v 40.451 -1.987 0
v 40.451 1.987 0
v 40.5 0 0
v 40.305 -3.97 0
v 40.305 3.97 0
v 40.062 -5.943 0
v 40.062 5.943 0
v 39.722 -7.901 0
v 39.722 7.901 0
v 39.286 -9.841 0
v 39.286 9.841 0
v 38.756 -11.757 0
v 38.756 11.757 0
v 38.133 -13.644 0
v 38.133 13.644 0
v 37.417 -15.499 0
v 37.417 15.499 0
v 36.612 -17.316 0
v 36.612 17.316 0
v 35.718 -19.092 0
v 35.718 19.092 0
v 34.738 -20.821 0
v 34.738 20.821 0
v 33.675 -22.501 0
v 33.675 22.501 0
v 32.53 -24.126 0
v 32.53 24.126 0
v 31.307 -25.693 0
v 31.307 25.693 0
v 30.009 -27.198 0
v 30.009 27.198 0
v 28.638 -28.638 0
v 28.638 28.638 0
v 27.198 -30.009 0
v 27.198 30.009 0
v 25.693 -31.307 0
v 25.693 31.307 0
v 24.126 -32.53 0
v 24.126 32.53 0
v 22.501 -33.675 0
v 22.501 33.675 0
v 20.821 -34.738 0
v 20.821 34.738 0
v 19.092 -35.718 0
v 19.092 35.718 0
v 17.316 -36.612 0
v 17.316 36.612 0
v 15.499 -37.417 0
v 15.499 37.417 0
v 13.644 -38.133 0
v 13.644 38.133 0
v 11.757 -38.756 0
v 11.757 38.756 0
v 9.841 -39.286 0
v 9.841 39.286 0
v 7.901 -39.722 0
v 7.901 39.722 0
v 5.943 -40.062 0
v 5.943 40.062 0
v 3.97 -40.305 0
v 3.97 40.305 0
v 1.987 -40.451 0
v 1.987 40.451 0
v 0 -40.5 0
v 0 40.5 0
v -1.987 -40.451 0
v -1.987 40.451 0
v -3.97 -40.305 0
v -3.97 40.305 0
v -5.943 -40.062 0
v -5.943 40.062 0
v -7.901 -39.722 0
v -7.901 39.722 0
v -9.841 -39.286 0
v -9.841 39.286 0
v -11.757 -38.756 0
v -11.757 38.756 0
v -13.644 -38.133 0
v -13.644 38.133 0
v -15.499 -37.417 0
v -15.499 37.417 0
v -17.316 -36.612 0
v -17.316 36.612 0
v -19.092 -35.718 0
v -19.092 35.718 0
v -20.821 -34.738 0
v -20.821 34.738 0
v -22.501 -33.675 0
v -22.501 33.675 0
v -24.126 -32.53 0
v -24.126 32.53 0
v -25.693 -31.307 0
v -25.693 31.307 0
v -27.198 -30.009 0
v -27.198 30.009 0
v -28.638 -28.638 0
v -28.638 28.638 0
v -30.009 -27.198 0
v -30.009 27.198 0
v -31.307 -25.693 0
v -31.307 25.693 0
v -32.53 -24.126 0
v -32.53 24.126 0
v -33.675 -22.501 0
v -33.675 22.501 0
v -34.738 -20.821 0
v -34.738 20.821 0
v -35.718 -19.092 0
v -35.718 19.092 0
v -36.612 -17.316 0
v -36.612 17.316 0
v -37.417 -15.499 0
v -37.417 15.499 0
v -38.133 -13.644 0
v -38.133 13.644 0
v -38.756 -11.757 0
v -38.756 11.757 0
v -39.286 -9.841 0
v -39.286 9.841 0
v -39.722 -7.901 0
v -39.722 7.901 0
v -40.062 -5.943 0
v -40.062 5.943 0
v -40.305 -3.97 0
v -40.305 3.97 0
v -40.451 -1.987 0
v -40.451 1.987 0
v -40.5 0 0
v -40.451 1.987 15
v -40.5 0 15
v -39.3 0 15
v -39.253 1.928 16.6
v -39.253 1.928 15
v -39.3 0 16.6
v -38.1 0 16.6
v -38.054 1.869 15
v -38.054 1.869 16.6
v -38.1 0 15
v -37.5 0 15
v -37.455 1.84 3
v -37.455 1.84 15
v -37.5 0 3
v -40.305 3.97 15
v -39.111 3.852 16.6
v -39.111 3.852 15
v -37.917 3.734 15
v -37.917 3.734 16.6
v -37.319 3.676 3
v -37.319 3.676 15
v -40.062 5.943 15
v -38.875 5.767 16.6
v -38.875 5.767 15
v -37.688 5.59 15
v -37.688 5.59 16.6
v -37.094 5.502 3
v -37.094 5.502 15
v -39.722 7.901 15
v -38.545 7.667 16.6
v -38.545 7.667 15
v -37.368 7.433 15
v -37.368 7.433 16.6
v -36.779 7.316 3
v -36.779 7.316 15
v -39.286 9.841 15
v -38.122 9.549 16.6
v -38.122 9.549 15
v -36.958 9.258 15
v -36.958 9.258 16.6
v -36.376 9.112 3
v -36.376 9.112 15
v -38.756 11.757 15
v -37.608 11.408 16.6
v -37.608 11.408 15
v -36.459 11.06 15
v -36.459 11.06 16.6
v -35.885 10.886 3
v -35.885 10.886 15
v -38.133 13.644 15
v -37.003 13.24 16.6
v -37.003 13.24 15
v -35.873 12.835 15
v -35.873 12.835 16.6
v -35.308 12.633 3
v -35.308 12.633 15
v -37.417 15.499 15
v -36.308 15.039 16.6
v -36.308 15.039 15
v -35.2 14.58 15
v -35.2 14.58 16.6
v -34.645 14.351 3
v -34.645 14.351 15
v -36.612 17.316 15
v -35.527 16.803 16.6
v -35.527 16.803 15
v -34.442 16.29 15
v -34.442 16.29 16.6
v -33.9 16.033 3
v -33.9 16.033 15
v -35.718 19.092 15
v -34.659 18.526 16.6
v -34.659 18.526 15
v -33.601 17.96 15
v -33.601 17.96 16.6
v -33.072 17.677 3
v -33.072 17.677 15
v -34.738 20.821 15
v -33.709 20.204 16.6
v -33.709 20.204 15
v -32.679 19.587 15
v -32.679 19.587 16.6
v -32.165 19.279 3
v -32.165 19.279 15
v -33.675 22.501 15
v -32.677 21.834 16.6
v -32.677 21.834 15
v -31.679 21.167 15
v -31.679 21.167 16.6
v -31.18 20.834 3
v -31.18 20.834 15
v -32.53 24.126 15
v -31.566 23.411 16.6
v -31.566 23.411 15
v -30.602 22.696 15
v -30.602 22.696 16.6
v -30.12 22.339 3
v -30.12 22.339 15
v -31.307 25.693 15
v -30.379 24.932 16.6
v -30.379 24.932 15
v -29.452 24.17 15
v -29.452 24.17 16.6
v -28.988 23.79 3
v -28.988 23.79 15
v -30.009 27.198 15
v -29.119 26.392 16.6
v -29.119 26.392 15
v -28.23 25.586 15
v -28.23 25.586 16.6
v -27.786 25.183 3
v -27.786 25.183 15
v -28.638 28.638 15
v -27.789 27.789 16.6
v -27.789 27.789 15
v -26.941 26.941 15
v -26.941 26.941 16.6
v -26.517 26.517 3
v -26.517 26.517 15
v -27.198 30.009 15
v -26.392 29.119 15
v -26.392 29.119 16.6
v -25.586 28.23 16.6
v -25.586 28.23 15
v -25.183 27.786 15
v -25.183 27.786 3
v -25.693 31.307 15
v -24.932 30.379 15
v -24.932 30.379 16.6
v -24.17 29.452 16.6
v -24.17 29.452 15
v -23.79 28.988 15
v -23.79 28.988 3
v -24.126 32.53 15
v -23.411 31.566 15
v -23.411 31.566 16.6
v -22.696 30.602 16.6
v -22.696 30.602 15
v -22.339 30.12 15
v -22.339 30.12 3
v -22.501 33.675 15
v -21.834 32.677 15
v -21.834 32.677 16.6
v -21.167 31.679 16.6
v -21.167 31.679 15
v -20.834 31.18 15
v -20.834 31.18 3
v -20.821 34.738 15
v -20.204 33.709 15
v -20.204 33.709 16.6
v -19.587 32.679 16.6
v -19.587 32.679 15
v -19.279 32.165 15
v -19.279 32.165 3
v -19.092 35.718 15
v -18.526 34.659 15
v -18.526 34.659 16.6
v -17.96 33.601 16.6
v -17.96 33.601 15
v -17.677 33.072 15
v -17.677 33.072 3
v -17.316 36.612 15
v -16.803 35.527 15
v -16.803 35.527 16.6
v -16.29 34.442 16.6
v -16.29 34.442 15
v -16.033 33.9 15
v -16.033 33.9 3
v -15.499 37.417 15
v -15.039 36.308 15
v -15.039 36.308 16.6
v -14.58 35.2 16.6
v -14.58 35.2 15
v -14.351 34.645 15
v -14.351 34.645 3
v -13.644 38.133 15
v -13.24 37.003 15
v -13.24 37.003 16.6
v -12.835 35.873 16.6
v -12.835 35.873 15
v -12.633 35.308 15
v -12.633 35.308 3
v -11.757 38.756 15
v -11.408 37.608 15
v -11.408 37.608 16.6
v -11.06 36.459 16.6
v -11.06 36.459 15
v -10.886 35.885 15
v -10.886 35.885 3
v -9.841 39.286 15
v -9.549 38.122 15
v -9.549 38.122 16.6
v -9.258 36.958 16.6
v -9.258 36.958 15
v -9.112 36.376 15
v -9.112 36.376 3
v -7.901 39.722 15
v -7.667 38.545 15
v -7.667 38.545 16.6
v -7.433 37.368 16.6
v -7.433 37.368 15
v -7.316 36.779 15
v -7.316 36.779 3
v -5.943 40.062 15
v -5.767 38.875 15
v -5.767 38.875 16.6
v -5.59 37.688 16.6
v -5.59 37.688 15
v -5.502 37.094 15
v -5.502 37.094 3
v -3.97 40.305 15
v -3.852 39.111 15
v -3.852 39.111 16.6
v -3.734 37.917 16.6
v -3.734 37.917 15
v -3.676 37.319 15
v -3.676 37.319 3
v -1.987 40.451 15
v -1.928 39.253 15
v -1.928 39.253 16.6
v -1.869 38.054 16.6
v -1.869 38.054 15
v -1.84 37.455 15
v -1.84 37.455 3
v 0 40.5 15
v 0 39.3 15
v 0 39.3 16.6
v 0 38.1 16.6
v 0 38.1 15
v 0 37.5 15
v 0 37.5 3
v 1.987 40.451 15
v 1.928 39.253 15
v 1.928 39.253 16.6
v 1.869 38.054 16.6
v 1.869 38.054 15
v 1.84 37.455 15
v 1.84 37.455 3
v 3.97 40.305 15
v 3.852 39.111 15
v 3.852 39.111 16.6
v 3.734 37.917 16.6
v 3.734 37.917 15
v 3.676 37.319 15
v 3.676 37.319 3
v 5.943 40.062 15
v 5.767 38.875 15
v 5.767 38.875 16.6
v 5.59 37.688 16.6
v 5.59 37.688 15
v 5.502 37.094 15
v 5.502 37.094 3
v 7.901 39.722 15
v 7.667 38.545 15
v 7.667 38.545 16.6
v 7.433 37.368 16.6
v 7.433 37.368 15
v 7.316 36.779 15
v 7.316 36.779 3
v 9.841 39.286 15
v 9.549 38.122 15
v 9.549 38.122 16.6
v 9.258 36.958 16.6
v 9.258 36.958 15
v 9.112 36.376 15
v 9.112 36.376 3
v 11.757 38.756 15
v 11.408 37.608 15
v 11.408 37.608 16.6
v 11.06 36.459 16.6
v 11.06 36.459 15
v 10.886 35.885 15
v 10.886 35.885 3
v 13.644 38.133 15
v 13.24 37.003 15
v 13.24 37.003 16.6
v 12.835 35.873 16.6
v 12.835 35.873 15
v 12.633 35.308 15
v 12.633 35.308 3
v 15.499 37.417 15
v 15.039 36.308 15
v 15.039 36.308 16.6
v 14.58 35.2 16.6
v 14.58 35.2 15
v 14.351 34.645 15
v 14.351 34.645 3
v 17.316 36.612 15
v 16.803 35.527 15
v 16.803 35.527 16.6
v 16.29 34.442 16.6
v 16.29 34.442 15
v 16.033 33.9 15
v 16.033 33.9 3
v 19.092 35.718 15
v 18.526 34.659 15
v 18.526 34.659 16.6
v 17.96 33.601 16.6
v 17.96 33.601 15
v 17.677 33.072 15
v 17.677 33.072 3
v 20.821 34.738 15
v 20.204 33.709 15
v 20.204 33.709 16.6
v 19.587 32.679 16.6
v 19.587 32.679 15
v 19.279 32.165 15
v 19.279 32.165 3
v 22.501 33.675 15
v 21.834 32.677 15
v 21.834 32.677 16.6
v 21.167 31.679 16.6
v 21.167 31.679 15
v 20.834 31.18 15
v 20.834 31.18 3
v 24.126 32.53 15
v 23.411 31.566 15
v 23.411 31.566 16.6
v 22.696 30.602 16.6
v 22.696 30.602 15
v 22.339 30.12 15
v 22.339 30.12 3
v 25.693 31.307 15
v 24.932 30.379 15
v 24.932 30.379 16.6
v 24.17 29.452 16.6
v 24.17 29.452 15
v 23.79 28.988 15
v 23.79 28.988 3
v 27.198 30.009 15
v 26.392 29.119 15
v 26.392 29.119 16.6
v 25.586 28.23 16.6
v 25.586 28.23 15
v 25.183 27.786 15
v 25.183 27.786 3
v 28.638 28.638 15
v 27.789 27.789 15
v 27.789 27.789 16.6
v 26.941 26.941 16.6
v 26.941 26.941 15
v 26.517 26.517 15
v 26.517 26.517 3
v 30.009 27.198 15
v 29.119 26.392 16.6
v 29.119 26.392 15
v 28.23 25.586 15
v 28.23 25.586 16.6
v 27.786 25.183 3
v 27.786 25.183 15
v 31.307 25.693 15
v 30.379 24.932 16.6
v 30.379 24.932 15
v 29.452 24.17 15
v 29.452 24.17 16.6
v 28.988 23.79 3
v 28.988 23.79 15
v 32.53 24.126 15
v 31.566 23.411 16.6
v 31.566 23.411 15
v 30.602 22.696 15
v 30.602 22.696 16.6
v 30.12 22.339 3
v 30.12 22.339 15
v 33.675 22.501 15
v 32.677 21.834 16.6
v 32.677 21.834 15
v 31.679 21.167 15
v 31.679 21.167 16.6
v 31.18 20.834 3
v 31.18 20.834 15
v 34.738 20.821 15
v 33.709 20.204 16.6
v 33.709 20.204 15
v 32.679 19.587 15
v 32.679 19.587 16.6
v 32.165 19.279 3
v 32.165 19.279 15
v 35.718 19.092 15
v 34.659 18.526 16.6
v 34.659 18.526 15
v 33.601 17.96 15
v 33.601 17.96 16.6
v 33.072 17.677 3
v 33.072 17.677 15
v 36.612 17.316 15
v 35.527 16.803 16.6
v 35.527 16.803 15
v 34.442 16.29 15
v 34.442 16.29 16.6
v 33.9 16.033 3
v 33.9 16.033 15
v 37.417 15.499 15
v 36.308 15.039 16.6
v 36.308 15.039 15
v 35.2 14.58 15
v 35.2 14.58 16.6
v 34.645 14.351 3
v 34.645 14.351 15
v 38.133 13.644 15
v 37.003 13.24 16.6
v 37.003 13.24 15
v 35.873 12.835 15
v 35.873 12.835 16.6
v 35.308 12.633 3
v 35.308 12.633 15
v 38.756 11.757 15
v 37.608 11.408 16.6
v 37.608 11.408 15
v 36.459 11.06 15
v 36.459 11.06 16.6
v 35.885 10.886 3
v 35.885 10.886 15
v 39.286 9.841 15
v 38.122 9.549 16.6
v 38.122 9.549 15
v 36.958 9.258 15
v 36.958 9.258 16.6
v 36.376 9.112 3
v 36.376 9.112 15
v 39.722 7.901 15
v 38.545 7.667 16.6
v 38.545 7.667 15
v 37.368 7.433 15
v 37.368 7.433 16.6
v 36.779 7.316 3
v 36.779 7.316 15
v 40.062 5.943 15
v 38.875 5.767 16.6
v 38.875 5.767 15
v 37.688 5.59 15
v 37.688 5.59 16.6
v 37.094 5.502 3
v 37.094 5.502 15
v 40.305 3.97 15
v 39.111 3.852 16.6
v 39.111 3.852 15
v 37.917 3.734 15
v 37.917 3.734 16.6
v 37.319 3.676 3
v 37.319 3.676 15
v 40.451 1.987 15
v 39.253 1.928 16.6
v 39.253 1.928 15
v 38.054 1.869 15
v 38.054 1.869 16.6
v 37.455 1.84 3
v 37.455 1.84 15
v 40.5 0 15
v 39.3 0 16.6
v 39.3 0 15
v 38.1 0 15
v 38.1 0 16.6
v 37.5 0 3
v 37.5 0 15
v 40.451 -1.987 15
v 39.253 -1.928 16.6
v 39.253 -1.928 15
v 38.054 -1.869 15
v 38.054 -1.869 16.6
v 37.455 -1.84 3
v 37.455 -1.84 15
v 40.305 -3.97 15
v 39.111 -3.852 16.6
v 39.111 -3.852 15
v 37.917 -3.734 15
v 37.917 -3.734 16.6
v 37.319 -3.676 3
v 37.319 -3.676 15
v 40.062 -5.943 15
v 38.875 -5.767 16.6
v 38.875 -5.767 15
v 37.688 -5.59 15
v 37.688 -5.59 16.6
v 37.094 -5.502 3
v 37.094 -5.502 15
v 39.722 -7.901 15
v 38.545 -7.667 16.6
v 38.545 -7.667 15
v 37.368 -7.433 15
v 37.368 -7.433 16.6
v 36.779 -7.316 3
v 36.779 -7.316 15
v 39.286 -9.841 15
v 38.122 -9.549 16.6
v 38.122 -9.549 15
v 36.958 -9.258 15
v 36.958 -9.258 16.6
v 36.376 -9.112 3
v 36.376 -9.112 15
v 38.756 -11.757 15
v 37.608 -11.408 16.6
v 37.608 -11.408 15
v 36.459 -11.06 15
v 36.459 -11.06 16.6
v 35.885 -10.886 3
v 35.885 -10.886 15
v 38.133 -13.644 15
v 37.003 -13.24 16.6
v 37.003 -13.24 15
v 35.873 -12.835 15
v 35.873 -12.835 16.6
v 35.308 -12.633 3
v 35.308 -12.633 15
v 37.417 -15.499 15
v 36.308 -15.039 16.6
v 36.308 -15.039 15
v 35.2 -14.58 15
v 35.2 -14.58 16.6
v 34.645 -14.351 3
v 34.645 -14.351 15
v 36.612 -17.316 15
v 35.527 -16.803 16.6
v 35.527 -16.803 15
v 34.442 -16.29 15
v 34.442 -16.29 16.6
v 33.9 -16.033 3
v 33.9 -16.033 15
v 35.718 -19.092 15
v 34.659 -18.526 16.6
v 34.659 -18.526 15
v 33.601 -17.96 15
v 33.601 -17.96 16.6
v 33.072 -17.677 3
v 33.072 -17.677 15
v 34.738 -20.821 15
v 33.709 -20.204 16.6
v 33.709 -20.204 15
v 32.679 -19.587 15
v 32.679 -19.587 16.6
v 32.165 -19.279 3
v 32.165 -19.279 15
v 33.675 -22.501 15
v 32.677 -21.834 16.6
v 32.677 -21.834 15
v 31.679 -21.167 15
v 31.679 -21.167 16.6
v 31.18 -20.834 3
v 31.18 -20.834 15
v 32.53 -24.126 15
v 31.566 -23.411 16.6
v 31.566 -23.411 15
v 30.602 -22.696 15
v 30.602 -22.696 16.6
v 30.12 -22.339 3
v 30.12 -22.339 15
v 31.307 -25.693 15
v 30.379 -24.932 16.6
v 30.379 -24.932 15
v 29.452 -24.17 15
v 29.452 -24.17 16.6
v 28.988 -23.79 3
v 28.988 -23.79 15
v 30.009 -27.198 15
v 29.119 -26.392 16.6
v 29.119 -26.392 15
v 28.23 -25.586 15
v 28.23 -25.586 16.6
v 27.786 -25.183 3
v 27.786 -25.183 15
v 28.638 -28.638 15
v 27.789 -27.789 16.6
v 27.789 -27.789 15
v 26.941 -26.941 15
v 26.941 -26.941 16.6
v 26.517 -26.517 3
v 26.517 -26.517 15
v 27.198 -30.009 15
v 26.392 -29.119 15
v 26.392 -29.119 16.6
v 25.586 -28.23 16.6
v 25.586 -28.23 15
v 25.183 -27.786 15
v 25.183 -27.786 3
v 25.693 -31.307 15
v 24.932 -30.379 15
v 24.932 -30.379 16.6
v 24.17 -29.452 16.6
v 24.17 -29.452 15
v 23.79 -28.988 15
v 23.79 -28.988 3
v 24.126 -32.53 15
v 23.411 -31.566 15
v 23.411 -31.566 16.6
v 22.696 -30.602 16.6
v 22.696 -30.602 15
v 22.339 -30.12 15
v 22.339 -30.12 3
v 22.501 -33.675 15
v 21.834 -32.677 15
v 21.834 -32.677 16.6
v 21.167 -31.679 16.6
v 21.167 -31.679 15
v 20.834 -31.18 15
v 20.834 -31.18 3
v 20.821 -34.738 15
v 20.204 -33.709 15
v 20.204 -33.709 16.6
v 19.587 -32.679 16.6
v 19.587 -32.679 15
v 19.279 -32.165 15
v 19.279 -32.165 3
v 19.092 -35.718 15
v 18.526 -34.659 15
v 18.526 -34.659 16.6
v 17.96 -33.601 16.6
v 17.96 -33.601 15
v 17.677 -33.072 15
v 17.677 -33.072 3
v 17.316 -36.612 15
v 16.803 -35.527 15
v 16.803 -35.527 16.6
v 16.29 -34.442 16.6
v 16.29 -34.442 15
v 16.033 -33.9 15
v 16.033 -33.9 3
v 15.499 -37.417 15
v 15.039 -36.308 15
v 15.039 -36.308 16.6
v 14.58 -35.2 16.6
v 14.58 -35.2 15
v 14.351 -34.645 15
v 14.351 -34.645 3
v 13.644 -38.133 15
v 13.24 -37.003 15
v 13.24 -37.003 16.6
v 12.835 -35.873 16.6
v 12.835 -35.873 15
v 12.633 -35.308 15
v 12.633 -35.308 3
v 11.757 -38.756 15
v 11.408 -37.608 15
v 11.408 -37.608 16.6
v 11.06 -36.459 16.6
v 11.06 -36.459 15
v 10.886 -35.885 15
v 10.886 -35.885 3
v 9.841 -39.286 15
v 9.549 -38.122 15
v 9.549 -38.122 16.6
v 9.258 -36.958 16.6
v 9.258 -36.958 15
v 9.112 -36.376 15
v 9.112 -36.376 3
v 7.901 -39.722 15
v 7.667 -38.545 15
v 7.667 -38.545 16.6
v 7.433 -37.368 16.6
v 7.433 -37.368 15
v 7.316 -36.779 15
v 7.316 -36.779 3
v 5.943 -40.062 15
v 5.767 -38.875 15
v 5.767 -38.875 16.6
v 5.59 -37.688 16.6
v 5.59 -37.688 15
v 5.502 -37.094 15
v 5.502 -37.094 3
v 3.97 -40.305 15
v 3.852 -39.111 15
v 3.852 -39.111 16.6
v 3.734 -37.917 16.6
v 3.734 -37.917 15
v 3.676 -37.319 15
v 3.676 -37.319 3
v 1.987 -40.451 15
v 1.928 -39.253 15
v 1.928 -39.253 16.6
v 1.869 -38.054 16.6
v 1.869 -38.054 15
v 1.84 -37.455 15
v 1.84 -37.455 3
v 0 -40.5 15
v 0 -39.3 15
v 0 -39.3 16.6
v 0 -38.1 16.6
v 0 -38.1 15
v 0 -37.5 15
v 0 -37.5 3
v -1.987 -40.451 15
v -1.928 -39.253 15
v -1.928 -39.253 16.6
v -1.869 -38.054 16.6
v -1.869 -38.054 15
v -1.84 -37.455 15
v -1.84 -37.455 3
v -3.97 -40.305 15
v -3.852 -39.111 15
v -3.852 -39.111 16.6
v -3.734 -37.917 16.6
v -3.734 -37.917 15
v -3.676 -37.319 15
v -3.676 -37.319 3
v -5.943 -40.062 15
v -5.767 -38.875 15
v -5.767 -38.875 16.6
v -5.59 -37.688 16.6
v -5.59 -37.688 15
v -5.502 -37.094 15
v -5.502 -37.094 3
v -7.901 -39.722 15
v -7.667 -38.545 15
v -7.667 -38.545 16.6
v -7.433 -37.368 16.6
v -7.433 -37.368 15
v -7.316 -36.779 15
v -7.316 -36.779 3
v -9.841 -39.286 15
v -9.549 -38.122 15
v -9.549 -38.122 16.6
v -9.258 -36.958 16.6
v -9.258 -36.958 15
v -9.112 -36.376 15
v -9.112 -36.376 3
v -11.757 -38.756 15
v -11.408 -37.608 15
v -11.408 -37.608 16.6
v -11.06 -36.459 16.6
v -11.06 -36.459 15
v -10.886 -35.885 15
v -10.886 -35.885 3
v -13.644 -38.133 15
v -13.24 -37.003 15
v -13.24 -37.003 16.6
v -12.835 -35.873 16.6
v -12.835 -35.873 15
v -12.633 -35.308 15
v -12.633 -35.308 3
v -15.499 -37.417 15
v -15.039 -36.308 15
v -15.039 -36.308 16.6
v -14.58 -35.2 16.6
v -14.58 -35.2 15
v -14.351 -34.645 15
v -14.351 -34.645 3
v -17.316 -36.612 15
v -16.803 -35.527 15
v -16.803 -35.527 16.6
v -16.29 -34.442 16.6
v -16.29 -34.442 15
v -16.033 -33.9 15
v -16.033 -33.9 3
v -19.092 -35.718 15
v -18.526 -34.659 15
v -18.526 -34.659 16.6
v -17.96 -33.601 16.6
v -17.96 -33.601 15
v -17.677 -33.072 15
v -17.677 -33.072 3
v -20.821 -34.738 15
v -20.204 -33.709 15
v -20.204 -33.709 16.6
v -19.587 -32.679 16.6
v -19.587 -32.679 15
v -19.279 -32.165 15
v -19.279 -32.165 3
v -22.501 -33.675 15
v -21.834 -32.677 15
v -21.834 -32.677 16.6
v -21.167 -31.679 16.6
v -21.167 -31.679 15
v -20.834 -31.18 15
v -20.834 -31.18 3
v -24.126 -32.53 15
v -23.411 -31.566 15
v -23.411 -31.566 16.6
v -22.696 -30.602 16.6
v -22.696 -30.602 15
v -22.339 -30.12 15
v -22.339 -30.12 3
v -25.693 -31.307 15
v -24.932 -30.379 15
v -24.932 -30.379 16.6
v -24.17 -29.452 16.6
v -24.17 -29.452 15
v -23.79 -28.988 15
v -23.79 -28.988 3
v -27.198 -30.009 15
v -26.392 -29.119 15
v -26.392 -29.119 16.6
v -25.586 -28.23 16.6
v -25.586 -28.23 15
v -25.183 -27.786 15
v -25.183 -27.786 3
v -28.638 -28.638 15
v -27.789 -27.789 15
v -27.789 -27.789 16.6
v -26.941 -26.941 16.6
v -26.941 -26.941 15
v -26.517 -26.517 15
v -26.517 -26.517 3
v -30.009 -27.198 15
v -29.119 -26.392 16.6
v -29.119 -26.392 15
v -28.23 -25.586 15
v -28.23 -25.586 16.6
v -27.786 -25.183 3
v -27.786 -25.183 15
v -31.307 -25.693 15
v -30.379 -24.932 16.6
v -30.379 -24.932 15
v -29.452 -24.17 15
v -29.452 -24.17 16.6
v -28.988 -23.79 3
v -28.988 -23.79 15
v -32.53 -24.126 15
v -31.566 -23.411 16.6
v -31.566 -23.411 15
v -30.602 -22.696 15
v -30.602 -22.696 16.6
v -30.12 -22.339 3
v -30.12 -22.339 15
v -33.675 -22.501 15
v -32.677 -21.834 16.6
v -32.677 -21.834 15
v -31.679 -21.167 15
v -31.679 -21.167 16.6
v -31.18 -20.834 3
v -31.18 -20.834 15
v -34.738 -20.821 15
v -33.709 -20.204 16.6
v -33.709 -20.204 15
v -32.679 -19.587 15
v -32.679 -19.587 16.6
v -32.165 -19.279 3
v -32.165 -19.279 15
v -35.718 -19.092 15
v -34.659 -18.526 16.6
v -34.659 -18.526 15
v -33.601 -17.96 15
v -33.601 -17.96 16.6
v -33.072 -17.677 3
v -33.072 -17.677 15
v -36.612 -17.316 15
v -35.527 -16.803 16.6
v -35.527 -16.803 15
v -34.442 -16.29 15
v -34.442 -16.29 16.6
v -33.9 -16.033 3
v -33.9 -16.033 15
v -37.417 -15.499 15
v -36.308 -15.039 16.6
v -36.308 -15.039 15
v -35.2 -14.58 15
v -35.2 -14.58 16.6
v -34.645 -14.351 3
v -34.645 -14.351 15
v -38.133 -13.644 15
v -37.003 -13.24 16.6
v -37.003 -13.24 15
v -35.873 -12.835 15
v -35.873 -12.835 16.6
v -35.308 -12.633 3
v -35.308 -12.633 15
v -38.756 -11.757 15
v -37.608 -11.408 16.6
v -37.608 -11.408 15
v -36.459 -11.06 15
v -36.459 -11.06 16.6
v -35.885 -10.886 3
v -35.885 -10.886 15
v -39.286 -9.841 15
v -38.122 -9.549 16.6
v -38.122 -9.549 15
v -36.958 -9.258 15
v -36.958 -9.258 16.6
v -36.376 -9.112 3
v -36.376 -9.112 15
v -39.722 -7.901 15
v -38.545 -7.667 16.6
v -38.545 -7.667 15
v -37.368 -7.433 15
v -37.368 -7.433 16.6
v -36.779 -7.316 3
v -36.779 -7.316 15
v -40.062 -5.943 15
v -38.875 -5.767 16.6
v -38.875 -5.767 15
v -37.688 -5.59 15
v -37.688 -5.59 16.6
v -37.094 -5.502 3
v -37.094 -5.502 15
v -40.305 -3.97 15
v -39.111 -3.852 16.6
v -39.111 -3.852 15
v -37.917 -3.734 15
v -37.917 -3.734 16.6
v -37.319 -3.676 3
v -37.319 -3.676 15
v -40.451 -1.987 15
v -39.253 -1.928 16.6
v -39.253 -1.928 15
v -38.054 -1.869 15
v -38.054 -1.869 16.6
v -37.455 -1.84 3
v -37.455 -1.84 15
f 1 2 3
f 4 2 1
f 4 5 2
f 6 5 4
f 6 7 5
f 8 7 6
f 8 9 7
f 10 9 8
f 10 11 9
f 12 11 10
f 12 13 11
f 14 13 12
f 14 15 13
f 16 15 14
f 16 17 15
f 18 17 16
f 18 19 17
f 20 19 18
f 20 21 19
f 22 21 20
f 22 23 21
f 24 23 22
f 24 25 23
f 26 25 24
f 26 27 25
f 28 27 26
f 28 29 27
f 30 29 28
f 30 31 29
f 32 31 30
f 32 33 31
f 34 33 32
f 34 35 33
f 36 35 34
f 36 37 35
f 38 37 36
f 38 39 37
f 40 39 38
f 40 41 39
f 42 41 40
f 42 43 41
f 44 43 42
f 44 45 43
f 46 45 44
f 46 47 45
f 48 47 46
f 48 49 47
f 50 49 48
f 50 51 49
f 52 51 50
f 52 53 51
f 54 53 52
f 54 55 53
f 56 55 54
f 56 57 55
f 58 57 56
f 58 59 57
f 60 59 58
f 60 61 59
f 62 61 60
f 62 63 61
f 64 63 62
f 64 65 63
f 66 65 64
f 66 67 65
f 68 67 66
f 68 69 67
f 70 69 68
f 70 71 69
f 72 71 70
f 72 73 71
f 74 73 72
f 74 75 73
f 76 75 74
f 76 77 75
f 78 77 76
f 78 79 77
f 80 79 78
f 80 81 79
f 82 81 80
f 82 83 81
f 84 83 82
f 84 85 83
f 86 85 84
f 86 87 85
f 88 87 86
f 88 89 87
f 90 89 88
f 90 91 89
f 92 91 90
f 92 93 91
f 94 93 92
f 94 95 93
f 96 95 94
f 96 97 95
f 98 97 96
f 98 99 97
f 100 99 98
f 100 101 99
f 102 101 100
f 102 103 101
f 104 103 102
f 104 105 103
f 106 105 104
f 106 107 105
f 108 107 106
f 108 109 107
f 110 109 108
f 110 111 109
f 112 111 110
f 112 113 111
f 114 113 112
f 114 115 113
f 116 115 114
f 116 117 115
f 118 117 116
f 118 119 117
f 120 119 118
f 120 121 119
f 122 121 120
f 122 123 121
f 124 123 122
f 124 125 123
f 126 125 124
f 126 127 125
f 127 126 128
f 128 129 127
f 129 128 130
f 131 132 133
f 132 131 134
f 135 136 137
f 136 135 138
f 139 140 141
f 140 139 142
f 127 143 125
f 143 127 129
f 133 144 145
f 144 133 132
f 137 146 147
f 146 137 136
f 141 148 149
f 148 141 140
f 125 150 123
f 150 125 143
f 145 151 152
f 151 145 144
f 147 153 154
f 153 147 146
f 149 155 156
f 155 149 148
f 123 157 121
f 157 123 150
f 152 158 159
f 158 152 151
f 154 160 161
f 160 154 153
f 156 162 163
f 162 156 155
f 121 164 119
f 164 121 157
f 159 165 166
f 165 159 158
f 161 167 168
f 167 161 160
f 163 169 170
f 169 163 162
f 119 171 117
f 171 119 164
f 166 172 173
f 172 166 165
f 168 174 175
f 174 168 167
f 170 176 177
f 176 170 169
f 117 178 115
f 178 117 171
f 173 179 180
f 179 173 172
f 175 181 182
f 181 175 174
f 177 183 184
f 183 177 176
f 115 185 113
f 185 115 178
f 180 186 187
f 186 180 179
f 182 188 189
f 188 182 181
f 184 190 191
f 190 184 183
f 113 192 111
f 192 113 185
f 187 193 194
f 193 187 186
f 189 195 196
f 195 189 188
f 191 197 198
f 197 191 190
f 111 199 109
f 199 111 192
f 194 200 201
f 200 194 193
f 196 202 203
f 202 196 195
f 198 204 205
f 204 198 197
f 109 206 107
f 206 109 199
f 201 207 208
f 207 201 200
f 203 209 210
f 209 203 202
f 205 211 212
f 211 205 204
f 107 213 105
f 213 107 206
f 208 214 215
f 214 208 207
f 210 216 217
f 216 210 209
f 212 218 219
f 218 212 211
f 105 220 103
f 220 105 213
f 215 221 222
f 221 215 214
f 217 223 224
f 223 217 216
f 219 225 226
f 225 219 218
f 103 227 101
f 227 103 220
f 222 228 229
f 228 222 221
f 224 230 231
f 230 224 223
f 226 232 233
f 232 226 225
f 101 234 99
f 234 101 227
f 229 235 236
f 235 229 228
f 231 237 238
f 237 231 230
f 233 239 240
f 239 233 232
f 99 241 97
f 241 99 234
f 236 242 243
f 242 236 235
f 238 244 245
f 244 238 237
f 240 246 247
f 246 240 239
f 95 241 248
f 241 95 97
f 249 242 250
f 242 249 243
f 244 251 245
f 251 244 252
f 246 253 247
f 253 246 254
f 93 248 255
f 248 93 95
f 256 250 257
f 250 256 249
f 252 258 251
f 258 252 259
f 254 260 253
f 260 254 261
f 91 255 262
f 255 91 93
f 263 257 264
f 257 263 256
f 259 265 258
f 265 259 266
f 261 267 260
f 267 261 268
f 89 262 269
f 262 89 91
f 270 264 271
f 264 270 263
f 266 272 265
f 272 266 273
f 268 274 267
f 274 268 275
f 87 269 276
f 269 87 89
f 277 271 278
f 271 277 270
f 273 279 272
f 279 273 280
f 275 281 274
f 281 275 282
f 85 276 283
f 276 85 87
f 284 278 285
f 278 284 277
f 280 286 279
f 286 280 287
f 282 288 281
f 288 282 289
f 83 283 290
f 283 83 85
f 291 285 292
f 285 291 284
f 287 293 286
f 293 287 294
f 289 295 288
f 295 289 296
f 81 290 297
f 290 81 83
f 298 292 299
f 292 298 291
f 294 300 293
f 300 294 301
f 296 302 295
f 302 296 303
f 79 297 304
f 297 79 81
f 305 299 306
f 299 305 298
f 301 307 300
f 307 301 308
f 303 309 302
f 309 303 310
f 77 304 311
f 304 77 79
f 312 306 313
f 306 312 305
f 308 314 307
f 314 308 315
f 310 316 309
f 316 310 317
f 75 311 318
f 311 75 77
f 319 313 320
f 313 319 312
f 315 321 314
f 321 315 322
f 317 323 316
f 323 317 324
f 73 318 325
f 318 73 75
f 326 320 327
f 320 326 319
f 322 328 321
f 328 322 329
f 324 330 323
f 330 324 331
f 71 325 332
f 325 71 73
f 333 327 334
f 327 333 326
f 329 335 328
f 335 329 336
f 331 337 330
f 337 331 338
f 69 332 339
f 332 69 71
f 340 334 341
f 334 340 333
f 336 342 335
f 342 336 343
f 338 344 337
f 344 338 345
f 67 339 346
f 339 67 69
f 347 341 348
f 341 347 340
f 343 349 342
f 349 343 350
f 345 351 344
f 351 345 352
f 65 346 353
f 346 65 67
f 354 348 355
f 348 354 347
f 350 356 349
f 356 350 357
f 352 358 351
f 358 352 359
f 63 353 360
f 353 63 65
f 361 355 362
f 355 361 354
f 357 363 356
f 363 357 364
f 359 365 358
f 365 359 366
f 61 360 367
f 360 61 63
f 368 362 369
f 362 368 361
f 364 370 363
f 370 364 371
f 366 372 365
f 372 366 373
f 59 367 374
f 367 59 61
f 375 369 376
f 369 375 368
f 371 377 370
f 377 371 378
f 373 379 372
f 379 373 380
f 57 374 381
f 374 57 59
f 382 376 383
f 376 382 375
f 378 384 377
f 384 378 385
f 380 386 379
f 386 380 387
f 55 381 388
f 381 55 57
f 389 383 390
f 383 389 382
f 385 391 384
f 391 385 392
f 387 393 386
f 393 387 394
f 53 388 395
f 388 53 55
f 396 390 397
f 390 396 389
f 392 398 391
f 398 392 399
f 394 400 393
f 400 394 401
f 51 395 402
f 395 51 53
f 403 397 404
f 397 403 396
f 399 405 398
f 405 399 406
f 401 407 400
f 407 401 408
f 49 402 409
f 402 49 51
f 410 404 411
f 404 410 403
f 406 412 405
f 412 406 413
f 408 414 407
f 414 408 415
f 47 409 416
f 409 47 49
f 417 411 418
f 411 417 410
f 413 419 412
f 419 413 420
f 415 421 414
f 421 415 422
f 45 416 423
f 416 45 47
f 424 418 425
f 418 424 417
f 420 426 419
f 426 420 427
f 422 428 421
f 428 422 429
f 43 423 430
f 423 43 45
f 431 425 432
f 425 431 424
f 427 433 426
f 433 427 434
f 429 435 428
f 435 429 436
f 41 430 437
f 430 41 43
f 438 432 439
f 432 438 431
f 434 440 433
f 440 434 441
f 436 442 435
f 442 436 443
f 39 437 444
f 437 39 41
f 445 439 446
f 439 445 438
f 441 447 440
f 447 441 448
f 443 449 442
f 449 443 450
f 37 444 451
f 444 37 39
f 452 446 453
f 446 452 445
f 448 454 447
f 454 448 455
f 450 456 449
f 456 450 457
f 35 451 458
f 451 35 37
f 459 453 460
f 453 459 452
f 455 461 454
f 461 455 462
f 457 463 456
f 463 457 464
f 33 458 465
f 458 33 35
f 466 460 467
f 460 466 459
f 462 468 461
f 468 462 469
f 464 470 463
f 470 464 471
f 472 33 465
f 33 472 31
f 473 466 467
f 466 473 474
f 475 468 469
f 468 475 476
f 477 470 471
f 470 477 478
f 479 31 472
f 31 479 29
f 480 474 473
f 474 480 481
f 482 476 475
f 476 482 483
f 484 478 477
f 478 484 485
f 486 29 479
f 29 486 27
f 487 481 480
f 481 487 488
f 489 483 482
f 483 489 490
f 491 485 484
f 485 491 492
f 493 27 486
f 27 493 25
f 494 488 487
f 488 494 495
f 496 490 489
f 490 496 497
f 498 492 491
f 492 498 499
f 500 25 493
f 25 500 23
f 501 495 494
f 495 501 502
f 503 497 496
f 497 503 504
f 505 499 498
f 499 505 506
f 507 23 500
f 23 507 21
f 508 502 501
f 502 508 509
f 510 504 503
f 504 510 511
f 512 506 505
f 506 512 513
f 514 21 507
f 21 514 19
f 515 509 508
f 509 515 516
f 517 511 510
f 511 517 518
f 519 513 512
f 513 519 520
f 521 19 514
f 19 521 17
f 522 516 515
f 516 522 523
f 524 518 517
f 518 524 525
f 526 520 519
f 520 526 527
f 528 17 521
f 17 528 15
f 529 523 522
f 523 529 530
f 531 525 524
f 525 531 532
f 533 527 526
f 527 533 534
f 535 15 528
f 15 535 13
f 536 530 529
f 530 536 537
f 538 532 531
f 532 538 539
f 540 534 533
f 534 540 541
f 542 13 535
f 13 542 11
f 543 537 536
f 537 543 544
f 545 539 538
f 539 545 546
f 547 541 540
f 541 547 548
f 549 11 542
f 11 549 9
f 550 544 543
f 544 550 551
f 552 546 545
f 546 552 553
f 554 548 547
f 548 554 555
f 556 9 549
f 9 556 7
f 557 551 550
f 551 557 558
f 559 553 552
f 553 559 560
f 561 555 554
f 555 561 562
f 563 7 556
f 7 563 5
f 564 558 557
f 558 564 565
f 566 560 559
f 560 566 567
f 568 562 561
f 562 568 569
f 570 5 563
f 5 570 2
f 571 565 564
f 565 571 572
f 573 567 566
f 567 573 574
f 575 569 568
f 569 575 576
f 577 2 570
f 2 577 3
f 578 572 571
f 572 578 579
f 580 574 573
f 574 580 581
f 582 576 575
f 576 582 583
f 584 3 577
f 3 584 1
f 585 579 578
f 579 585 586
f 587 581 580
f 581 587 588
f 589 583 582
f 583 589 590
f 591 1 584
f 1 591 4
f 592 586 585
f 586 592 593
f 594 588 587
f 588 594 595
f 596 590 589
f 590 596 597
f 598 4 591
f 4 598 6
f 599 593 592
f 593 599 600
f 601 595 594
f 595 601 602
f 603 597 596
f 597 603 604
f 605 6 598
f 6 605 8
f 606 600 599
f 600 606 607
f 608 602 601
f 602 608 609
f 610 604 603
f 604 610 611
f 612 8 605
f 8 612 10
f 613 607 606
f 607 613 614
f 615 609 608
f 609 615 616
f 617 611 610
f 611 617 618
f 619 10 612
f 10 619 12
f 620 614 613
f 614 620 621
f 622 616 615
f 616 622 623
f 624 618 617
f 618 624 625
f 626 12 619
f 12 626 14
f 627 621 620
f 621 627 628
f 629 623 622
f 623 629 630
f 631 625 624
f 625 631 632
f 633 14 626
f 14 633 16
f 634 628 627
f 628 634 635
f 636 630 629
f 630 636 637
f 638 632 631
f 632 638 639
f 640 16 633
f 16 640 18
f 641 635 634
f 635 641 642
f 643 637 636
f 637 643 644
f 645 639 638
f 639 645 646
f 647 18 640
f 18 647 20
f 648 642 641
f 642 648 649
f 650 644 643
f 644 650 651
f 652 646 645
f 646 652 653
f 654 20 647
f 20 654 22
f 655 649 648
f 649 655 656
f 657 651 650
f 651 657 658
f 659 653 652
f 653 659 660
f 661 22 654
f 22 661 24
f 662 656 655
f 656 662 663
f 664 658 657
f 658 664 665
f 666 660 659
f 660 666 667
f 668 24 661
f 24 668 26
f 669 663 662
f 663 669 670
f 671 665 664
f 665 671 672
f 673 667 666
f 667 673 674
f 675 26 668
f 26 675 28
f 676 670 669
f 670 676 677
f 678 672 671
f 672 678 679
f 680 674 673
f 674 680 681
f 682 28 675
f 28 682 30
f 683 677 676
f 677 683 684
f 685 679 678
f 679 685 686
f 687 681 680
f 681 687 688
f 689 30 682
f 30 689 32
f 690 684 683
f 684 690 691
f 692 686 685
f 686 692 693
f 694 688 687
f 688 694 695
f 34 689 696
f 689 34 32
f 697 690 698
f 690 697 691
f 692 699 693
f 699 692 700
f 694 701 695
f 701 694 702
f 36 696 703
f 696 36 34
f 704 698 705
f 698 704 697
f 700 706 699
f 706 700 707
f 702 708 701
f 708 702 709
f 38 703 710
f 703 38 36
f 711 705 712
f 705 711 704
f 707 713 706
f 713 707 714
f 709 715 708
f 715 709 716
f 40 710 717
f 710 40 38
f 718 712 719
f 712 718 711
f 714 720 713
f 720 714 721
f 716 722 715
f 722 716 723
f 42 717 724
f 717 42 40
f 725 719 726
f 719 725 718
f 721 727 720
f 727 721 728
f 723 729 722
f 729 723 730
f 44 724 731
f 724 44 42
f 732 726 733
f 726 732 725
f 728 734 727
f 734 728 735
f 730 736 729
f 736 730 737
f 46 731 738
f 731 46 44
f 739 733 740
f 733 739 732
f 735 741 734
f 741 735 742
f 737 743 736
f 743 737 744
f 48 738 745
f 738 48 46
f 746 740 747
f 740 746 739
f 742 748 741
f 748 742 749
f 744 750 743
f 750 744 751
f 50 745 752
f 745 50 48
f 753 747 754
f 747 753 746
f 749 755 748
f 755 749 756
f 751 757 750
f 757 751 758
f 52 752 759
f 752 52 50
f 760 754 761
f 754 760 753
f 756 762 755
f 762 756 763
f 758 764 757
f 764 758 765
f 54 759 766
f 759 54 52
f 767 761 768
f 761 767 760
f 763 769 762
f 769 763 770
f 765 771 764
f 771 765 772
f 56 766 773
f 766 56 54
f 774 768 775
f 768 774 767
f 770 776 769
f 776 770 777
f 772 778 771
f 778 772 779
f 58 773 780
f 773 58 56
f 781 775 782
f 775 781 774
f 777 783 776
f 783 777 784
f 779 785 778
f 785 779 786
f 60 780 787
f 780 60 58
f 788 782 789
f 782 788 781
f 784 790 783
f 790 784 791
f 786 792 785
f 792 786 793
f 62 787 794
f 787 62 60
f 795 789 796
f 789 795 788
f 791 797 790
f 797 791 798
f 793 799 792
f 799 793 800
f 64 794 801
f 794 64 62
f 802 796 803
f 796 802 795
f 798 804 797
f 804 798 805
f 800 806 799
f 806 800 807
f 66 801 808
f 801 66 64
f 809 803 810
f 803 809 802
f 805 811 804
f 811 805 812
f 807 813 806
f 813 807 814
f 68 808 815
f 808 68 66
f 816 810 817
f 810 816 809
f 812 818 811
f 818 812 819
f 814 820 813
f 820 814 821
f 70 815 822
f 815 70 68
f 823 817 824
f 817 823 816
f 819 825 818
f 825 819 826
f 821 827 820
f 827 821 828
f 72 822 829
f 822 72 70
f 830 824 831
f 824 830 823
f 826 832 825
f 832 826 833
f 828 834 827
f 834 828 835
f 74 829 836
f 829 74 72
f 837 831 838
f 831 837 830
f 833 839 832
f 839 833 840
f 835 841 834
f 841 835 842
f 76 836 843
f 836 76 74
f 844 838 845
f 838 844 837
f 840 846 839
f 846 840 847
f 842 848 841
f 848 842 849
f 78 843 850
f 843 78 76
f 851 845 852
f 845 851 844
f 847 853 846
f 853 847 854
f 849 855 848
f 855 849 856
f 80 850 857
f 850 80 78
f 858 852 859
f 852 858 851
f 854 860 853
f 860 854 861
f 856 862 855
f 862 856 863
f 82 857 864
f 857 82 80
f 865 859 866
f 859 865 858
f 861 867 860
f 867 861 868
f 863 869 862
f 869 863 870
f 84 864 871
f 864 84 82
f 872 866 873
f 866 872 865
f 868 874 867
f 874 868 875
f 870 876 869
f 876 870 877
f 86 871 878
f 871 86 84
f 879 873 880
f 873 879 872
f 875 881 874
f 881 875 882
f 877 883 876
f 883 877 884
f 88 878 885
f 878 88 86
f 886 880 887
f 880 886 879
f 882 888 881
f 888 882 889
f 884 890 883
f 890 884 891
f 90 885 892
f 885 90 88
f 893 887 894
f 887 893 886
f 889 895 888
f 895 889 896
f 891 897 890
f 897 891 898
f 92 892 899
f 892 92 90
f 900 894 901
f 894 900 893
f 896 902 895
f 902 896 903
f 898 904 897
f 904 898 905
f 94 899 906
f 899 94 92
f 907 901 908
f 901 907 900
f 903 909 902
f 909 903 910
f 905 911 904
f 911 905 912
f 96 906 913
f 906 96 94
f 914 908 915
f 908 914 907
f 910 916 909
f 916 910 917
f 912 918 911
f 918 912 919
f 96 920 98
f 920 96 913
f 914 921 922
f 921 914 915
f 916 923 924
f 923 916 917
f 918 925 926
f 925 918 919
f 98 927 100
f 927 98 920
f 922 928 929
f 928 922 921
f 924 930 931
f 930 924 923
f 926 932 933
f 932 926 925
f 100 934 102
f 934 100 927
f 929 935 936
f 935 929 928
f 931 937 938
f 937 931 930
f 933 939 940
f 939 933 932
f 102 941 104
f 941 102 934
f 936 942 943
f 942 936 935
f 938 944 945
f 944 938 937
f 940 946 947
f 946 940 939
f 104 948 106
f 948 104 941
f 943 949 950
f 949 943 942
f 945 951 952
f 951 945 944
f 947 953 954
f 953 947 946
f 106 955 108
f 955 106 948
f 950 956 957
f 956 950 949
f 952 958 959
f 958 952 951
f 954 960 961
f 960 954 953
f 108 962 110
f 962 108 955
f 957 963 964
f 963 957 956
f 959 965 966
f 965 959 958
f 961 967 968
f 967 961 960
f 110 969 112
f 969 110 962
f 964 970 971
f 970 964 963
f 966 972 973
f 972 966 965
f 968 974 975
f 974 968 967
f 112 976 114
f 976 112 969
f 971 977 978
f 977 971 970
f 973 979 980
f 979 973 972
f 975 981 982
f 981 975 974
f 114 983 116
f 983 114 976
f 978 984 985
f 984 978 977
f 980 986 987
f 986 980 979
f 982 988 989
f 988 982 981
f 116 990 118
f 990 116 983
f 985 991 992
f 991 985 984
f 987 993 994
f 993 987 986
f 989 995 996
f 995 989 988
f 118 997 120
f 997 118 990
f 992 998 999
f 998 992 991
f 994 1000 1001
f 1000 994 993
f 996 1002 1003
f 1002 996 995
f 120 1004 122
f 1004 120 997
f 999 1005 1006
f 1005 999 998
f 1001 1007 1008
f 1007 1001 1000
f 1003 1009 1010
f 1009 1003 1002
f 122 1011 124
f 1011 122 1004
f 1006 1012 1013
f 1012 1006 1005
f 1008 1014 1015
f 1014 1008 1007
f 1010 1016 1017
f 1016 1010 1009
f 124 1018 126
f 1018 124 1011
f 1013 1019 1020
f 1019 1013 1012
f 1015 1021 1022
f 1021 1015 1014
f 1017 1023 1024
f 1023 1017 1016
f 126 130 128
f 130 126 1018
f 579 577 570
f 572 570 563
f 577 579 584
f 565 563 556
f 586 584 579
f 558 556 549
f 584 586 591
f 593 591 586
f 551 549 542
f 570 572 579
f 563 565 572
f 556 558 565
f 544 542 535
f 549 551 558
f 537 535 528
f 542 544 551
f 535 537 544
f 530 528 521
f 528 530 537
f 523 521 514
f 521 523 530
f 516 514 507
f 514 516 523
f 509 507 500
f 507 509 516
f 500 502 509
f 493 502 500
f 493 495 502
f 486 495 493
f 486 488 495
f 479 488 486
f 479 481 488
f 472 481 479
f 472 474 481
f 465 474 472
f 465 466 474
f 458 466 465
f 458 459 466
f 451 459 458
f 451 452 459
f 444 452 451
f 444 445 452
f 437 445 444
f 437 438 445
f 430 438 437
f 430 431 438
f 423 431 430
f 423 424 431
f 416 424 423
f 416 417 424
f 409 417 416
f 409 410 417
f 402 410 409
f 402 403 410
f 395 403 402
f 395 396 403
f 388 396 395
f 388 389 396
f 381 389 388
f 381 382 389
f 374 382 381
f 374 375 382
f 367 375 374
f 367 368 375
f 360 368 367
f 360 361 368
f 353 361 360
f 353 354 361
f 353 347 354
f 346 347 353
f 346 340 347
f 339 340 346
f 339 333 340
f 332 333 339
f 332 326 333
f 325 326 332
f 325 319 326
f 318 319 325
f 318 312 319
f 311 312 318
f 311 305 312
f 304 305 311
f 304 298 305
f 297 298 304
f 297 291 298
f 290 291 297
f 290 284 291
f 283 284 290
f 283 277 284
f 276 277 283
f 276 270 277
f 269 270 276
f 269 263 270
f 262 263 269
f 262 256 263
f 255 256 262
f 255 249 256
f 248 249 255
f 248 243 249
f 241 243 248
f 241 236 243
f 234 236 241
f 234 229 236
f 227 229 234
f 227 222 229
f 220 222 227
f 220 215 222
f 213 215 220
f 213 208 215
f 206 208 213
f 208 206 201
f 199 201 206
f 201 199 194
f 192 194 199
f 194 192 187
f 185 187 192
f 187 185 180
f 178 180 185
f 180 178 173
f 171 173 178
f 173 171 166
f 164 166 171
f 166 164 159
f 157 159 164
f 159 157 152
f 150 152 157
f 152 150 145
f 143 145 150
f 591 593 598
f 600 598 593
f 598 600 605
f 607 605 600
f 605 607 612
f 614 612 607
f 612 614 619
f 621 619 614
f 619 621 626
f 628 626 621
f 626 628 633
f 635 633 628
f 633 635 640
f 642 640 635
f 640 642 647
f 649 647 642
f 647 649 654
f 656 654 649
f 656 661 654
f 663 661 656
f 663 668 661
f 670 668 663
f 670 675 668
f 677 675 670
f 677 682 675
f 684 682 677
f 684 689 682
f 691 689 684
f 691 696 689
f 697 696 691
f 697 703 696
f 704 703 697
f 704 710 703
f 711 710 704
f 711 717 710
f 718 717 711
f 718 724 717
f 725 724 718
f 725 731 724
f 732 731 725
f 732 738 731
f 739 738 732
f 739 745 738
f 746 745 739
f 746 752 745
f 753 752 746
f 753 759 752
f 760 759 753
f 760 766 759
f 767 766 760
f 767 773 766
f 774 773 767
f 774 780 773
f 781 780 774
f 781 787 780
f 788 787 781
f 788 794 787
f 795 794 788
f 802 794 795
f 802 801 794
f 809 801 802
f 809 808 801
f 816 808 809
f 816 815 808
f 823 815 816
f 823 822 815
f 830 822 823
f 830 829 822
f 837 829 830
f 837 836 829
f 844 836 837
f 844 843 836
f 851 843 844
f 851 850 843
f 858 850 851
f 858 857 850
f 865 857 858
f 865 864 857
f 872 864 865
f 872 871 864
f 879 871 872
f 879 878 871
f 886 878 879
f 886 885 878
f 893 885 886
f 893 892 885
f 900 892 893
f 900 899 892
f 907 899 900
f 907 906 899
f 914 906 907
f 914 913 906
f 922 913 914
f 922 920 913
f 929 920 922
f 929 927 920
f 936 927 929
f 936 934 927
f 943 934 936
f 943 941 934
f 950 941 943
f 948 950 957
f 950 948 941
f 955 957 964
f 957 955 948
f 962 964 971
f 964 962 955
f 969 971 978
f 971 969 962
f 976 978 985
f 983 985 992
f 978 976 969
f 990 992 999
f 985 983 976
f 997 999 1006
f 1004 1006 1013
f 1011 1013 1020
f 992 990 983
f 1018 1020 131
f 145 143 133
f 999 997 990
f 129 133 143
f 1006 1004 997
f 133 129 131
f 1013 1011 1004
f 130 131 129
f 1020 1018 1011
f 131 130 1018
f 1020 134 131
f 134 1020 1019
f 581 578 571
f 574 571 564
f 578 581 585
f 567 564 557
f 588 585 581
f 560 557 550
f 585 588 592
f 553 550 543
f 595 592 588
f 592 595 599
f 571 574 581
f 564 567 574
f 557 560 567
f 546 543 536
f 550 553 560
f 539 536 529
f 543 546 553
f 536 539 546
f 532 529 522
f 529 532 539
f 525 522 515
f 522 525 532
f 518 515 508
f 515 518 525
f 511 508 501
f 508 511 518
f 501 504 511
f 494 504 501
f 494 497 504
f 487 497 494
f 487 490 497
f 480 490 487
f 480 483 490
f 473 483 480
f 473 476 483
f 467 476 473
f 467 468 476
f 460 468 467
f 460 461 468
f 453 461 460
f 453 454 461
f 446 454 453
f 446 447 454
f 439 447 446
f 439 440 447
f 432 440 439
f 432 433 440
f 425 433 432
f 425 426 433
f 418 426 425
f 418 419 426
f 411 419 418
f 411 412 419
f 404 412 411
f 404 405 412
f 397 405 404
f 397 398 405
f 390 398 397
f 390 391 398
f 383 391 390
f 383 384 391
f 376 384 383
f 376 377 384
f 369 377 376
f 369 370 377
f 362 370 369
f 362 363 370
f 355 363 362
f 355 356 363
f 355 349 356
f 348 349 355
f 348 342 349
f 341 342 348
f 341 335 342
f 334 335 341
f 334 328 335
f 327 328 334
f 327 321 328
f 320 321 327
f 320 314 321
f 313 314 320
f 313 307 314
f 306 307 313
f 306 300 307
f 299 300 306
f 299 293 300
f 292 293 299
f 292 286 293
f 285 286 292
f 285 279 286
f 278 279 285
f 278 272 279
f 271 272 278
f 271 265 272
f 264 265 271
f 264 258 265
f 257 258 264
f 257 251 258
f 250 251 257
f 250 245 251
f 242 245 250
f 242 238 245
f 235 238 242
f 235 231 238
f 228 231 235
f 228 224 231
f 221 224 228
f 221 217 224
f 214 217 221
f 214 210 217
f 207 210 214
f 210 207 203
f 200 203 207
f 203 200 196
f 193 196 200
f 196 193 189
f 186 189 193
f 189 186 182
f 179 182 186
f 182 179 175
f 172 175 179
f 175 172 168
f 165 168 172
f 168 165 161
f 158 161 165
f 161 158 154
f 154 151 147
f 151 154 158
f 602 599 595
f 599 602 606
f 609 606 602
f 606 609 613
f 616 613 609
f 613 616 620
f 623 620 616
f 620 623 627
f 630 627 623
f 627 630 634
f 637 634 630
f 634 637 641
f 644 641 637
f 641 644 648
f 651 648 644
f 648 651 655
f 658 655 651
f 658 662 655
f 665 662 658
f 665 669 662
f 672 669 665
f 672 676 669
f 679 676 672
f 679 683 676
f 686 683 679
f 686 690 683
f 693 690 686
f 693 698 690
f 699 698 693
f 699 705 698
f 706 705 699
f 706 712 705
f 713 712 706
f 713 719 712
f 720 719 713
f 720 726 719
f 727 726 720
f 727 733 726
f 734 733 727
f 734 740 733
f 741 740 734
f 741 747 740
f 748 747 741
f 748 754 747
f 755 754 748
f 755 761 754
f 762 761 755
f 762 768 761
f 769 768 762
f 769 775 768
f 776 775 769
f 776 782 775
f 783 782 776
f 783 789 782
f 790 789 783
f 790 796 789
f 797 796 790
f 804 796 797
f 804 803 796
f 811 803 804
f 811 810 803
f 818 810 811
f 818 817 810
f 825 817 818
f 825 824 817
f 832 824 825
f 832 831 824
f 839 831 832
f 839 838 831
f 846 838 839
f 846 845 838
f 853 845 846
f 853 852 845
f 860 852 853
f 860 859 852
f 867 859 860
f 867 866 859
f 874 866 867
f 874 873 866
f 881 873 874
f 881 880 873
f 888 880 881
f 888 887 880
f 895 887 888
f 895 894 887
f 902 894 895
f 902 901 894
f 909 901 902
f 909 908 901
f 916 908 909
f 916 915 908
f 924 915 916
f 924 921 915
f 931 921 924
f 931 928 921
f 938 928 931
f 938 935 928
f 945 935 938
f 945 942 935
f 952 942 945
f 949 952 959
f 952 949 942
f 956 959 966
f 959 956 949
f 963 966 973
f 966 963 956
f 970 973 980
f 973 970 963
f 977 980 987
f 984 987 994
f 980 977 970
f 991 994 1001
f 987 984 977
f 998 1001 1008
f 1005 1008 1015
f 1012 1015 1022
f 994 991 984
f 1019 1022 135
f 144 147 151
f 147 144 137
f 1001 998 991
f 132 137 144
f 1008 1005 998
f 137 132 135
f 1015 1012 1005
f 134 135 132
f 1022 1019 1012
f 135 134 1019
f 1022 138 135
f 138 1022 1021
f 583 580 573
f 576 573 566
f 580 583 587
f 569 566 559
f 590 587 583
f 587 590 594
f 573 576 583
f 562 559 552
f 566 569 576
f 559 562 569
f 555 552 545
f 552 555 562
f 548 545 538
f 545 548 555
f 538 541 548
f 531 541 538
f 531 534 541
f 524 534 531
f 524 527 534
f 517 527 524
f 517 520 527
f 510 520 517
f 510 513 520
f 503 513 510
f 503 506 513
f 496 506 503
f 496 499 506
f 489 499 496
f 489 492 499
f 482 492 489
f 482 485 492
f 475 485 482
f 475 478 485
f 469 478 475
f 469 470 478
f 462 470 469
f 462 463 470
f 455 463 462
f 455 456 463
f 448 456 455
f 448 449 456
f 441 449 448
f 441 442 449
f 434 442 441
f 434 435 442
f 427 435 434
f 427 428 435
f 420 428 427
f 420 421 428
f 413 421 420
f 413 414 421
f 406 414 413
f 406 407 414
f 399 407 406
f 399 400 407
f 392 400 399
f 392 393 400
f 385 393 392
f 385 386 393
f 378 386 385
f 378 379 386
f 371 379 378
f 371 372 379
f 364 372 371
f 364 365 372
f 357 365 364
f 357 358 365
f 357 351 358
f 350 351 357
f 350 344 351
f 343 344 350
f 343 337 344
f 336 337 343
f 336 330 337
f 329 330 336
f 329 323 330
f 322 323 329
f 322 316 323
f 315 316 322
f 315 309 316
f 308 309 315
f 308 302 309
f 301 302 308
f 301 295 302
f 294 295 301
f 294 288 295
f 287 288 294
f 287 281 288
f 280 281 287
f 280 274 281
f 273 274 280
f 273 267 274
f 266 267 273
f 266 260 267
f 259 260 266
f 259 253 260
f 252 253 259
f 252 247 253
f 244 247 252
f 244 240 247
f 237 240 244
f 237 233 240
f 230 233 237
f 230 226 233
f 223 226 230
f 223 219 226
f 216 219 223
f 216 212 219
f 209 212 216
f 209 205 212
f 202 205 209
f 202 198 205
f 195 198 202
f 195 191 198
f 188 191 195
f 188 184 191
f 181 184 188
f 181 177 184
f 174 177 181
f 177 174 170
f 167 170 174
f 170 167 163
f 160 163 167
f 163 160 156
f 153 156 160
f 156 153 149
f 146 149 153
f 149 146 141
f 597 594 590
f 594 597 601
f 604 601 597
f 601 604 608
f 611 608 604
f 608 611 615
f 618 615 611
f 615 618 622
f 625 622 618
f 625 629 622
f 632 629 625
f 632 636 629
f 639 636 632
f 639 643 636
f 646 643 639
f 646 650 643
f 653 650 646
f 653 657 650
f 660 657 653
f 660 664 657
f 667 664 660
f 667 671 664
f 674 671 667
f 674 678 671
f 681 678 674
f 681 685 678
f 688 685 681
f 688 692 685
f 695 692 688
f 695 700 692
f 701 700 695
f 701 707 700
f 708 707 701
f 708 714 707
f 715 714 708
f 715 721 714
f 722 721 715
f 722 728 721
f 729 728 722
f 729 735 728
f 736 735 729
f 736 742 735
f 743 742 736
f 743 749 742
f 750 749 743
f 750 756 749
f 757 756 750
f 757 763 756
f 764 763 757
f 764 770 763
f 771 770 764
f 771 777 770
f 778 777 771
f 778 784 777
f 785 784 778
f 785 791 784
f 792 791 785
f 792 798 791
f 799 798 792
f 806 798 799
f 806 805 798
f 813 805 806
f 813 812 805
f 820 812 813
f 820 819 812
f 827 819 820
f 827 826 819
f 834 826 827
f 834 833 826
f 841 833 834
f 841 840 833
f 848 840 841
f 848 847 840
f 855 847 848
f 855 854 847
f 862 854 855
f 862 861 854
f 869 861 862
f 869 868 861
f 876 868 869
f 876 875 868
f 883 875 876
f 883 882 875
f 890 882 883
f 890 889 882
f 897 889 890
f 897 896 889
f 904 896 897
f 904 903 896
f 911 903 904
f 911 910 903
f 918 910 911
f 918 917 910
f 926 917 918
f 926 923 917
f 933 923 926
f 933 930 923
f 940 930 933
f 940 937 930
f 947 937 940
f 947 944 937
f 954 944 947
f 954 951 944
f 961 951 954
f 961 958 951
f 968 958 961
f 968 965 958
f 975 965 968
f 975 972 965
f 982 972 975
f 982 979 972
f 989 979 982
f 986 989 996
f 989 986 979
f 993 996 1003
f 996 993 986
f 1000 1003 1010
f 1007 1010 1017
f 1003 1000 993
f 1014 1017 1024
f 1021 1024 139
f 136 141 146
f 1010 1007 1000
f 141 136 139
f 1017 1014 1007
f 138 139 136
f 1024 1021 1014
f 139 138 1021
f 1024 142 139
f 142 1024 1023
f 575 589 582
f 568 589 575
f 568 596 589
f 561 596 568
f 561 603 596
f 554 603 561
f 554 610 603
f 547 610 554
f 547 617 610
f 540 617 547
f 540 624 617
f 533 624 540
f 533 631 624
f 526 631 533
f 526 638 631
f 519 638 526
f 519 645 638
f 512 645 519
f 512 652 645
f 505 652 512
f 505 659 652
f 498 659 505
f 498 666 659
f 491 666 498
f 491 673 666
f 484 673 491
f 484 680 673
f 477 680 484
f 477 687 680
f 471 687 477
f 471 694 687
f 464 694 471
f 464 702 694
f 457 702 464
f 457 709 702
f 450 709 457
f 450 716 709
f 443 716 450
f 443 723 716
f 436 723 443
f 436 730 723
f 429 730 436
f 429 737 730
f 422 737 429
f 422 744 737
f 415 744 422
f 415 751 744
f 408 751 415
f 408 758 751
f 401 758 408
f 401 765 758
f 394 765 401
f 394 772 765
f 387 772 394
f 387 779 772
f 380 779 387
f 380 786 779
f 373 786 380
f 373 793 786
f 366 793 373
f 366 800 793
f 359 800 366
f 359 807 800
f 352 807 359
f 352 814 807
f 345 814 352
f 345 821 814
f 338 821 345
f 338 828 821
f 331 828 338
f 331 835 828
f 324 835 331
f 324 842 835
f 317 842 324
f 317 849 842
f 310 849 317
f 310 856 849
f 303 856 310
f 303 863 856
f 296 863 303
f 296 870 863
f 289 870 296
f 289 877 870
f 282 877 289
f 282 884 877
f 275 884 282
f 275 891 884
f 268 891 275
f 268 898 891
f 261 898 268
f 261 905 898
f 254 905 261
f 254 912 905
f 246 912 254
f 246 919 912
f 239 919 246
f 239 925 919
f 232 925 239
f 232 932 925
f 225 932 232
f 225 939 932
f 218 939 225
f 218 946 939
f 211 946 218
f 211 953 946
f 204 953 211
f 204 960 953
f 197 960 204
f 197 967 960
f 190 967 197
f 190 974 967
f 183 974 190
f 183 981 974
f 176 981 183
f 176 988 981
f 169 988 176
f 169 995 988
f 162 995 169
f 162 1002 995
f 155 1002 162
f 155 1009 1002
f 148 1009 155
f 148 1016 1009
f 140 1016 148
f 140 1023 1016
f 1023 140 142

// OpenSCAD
/* [Object Type] */
//Model Part
ObjectType=1; // [1:Bottom Cup, 2:Sorting Plate Attached To Cup, 3:Sorting Plate, 4:Sorting Cup, 5:Lid]

/* [Printer] */
Tolerance = .2; //.1
 //NozzleSize = "Not Used Yet";
 //LayerHeight = "Not Used Yet";
 //FirstLayer = "Not Used Yet";

/* [Global Settings] */
WallThickness = 3.0; //.1
TrayDiameter = 75; //.1
TabWidth = 1.2; //.1
TabHeight = 1.6; //.1

 /* [Sorting plate] */
// Nut Size 
NutSize=2; // [1:M2.5, 2:M3, 3:M4, 4:M5, 5:M6, 6:M8, 7:Machine #10, 8:Machine #8, 9:Machine #6, 10:Machine #4, 11:Machine #3, 12:Machine #2, 13:Machine #1, 14:1/4 in., 15:5/16ths, 16:3/8ths, 17:7/16ths, 18:1/2 in., 19:9/16ths, 20:5/8ths , 21:3/4ths, 22:7/8ths]
// Hole Spacing
HoleSpacing = 2;
//Text Area
TextArea = 9.5; //.2
//Show Text Area
ShowTextArea = false;
//Text Size
TextSize = 5;
// Text height off plate
TextHeight = 1.0; //.1
// Hole Pattern
Pattern=1; // [1:Circle, 2:Grid]
// Custom Label
CustomLabel = "";

 /* [Sorting tray layer] */
TrayHeight = 15; //.1
LipWidth = 2; //.1

/* [Bottom Cup] */
BaseHeight = 15; //.1
BaseThickness = 1.6; //.1

/* [Lid] */
LidHeight = 5; //.1
LidThickness = 1.6; //.1

 module __Customizer_Limit__ () {}  // Hides any more variables from the customizer

// Machine 
Machine_10 = 10.287;
Machine_8 = 9.3853;
Machine_6 = 8.0391;
Machine_4 = 6.9215;
Machine_3 = 5.3594;
Machine_2 = 4.8895;
Machine_1 = 2.1717;

// Imperial
I_1_4th = 11.6205;
I_5_16ths = 13.4874;
I_3_8ths = 15.3035;
I_7_16ths = 18.0086;
I_Half_Inch = 20.7518;
I_9_16ths = 23.4696;
I_5_8ths = 26.1747;
I_3_4ths = 29.5021;
I_7_8ths = 34.8742;

// Metric
Metric_2_5 = 5.57;
Metric_3 = 5.8;
Metric_4 = 7;
Metric_5 = 8.435;
Metric_6 = 11.8;
Metric_8 = 14.695;

Sizes=[
    Metric_2_5, Metric_3, Metric_4, Metric_5, Metric_6, Metric_8, 
    Machine_10, Machine_8, Machine_6, Machine_4, Machine_3, Machine_2, Machine_1,
    I_1_4th, I_5_16ths, I_3_8ths, I_7_16ths, I_Half_Inch, I_9_16ths, I_5_8ths , I_3_4ths , I_7_8ths 
];

Labels=[
    "M2.5", "M3", "M4", "M5", "M6", "M8", 
    "#10","#8","#6", "#4", "#3", "#2", "#1",
    "1/4", "5/16", "3/8", "7/16", "1/2", "9/16", "5/8" , "3/4" ,"7/8" 
];

// Used for customizer menus
Patterns=["circular","rect"];

// Calculated variables
TrayRadius = TrayDiameter/2;
HoleSize = Sizes[NutSize-1];
Label = Labels[NutSize-1];
PatternChoice = Patterns[Pattern-1];

$fn = $preview ? 60 : 128;

if (ObjectType == 1) {
    rotate_extrude() {
        translate([TrayRadius,0,0])
        polygon([
        [0,0],
        [WallThickness-TabWidth*2-Tolerance,0],
        [WallThickness-TabWidth*2-Tolerance,TabHeight+Tolerance],
        [WallThickness-TabWidth+Tolerance,TabHeight+Tolerance],
        [WallThickness-TabWidth+Tolerance,0],
        [WallThickness,0],
        [WallThickness,BaseHeight],
        [WallThickness-TabWidth,BaseHeight],
        [WallThickness-TabWidth,BaseHeight+TabHeight],
        [WallThickness-TabWidth*2,BaseHeight+TabHeight],
        [WallThickness-TabWidth*2,BaseHeight],
        [0,BaseHeight]
        ]);
    }

    cylinder(h=WallThickness,d=TrayDiameter+WallThickness*2);
}
else if(ObjectType == 4) {
    SortCup();
}
else if(ObjectType == 5) {
    translate([0,0,LidHeight]) 
    rotate([180,0,0]) {
        translate([0,0,LidHeight-LidThickness]) cylinder(h = LidThickness, d = TrayDiameter);

        rotate_extrude()
        translate([TrayRadius,0,0]) {
            difference() square([WallThickness,LidHeight]);
            translate([WallThickness/2-TabWidth/2-Tolerance,0,0])   square([TabWidth+Tolerance*2, TabHeight+Tolerance]);
        }
    }
}
else { // Tray only or tray and lid

    color("yellow")
    translate([0,0,TextHeight]) 
        linear_extrude(BaseThickness)
            text(CustomLabel == "" ? Label : CustomLabel,size=TextSize,halign="center",valign="center");
        
    if (ShowTextArea) color("red") #cylinder(h = 10, r = TextArea,center=true);

    difference(){
        cylinder(h=BaseThickness,d=TrayDiameter-Tolerance);

        if (PatternChoice == "circular"){
            firstPosition = TrayRadius-HoleSize/2-LipWidth;

            for(xpos=[firstPosition:-(HoleSize+HoleSpacing):TextArea+HoleSize/2])
            {
                steps = ceil(2*PI*xpos/(HoleSize+HoleSpacing));
                for(step=[1:1:steps])
                    rotate([0,0,step*(360/steps)])  translate([xpos,0,-1]) cylinder(h=5,d=HoleSize);
            }
        }
        else {
            r2 = HoleSize/2;

            maxHole = 0; 

            CopyMirror(){
                for(x2=[0:HoleSize+HoleSpacing:TrayRadius])
                    for(y2=[0:HoleSize+HoleSpacing:TrayRadius]){
                        distance = sqrt(((0 - x2) * (0 - x2)) + ((0 - y2) * (0 - y2)));

                        if (distance + r2 <= TrayRadius-LipWidth && distance + r2 > TextArea + HoleSize)
                            translate([x2,y2,0]) cylinder(h=BaseThickness*3,d=HoleSize,center=true);
                    }
                }
            }
        }       
    
    if (ObjectType == 2)    translate([0,0,.001])   SortCup();
}


module CopyMirror(){
    children();
    mirror([1,0,0]) children();
    mirror([0,1,0]) children();
    mirror([1,1,0]) children();
}

module SortCup(){
    rotate_extrude()
    translate([TrayRadius,0,0]){
        translate([-LipWidth,0,0])  square([LipWidth,BaseThickness]);

        translate([WallThickness/2-TabWidth/2,TrayHeight,0])  square([TabWidth,TabHeight]);

        difference()
            square([WallThickness,TrayHeight]);
            translate([WallThickness/2-TabWidth/2-Tolerance,0,0]) square([TabWidth+Tolerance*2, TabHeight+Tolerance]);
    }
}
